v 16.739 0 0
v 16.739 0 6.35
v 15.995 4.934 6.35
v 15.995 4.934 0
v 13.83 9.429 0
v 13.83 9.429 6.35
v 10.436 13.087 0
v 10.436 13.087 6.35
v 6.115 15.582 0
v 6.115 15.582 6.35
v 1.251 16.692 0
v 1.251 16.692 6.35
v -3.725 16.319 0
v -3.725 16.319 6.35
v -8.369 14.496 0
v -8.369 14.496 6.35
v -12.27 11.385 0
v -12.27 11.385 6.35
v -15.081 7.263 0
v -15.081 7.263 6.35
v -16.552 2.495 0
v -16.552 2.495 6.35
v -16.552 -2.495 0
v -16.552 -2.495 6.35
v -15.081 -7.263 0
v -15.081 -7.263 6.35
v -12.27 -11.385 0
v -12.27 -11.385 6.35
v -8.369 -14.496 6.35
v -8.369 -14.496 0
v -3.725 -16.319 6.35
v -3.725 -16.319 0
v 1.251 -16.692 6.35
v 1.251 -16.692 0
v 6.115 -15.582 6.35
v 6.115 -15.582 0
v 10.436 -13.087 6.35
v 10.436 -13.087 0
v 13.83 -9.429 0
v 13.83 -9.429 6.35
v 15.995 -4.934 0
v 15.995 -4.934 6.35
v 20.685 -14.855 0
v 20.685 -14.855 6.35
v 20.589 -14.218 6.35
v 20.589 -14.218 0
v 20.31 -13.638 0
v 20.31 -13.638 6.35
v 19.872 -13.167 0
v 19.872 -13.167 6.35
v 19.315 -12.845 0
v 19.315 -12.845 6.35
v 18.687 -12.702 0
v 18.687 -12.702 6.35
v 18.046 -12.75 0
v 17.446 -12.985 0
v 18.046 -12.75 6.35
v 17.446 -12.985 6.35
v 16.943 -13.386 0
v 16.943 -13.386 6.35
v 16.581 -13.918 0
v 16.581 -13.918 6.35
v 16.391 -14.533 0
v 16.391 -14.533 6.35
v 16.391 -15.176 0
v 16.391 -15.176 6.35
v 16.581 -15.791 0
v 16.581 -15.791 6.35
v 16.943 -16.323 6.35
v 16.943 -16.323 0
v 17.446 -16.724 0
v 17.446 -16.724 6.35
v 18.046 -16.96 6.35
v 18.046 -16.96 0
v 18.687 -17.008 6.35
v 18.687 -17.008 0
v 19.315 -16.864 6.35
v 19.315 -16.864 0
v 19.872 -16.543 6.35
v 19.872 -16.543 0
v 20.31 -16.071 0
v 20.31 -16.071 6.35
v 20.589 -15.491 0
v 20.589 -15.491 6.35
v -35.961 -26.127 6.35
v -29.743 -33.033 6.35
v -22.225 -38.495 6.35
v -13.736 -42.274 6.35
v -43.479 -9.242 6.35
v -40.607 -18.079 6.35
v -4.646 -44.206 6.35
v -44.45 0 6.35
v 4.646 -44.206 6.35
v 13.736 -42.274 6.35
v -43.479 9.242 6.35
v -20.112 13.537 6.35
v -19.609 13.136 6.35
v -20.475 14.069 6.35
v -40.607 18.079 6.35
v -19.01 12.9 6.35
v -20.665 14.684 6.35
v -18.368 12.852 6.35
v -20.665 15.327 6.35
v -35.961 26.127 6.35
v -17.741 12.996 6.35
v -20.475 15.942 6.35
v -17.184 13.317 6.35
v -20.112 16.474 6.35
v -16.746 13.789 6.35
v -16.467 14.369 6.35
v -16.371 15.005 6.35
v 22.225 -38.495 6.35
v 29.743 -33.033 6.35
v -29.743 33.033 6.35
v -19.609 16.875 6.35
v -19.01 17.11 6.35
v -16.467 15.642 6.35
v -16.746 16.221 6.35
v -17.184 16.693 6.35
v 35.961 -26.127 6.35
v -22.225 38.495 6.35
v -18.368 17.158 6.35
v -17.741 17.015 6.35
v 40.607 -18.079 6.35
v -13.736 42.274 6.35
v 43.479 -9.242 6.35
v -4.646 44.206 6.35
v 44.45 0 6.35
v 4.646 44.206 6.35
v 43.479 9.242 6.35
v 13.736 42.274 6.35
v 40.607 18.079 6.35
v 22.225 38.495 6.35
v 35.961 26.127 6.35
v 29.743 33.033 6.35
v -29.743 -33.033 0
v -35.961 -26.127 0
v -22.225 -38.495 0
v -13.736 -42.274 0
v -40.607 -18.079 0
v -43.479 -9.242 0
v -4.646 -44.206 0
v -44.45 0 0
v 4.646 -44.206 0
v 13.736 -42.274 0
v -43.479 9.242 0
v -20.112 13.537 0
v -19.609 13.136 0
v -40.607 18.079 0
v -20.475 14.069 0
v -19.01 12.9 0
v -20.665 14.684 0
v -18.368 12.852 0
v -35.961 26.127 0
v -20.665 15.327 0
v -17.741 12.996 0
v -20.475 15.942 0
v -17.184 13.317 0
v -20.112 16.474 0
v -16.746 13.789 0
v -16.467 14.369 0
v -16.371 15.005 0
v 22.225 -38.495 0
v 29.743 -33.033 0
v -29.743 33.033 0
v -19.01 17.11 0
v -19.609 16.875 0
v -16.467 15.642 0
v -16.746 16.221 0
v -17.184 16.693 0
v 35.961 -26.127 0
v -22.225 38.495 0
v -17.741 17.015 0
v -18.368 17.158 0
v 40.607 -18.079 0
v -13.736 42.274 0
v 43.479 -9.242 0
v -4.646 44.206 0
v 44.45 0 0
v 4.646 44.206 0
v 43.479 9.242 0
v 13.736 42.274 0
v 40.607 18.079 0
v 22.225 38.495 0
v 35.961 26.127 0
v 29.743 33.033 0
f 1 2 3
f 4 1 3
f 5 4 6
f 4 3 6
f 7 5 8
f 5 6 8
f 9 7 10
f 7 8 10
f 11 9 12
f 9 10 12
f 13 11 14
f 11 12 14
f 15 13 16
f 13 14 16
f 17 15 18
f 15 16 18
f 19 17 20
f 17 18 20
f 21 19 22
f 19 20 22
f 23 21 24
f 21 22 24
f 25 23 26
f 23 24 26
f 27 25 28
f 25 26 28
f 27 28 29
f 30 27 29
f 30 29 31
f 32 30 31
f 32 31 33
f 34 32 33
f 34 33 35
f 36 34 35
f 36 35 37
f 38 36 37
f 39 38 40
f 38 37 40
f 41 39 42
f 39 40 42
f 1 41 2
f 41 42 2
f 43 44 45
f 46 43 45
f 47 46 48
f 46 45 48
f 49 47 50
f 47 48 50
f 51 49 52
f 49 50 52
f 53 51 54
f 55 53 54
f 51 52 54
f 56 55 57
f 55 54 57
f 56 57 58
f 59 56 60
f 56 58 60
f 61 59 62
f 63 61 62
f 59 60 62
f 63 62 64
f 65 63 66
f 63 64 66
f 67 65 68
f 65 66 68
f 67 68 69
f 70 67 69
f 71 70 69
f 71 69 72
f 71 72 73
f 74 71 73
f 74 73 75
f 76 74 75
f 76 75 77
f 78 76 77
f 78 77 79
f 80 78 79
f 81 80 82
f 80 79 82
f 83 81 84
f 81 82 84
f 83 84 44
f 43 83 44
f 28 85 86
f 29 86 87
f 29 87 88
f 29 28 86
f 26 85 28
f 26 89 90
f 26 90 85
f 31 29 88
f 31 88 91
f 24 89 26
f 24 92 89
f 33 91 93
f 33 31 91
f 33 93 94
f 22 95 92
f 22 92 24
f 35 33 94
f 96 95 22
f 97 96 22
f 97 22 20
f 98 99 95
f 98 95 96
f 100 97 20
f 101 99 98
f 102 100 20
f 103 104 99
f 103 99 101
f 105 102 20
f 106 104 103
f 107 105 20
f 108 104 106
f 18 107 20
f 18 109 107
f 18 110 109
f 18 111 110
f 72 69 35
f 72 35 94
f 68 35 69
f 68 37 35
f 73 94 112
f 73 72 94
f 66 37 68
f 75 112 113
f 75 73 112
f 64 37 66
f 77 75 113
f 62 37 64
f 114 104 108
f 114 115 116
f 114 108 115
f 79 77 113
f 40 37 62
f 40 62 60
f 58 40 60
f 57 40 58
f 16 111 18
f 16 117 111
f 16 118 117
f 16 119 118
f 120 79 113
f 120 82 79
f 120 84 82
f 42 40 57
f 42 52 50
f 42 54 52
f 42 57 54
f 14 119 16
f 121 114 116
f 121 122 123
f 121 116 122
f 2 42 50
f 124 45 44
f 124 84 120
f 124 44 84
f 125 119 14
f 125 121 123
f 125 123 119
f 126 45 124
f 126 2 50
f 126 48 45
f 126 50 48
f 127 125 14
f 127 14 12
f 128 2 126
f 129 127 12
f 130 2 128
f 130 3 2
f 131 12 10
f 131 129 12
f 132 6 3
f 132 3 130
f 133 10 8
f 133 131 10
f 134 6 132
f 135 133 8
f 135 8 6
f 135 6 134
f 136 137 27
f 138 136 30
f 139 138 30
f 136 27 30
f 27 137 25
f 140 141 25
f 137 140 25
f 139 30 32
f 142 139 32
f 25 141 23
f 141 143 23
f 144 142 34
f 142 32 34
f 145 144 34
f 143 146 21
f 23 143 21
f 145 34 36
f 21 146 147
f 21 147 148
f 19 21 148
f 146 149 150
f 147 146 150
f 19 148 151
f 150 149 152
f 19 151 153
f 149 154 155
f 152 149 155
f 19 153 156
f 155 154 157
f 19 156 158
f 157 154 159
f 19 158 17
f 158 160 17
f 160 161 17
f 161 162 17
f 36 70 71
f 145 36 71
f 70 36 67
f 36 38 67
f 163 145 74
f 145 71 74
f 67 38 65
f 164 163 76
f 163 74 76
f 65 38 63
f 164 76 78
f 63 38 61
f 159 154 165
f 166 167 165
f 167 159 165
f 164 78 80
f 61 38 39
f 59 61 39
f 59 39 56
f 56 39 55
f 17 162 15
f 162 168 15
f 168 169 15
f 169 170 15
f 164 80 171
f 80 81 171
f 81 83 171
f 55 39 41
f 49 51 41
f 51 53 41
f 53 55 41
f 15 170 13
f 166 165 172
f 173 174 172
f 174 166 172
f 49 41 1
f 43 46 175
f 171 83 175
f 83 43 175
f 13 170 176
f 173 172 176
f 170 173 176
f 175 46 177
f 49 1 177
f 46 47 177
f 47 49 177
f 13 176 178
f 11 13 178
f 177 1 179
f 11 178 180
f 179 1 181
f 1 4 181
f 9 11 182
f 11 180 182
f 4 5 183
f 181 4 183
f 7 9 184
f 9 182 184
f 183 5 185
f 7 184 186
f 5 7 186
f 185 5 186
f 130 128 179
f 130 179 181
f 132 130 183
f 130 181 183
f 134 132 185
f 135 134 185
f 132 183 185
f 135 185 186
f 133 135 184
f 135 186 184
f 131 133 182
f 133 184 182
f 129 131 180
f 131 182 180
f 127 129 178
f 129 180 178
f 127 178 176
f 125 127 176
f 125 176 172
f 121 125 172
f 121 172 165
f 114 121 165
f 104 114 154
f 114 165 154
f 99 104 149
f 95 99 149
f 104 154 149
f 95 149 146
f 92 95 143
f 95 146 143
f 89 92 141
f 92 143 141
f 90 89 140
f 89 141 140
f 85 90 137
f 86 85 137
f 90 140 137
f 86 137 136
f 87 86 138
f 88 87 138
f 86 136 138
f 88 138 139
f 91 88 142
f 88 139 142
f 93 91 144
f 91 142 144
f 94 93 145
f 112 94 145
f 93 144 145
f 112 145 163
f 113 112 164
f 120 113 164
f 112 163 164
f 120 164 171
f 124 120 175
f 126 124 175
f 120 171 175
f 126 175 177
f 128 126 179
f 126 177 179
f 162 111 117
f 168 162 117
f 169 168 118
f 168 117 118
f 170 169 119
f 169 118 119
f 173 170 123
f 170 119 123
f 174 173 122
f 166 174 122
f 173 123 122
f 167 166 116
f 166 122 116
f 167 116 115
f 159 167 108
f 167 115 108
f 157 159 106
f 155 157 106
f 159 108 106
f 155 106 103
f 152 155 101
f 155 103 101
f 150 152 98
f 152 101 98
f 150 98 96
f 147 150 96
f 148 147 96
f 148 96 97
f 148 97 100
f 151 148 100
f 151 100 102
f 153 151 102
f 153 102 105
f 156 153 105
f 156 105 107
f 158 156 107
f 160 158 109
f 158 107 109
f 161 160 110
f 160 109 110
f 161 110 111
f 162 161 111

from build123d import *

# Parameters (mm, degrees)
F0_R      = 44.45
F1_DEPTH  = 6.35
F2_R      = 16.7386
F3_DEPTH  = 6.35
F7_R      = 2.159
F8_DEPTH  = 6.35
F9_R      = 2.159
F10_DEPTH = 6.35


with BuildPart() as f1:
    # F0 (on Top) → F1 (new body)
    with BuildSketch(Plane.XY):
        Circle(F0_R)
    extrude(amount=F1_DEPTH)

    # F2 (on face) → F3 (cut)
    with BuildSketch(Plane.XY.offset(6.35)):
        Circle(F2_R)
    extrude(amount=-F3_DEPTH, mode=Mode.SUBTRACT)

    # F7 (on face) → F8 (cut)
    with BuildSketch(Plane.XY.offset(6.35)):
        with Locations((-18.529808, 15.005284)):
            Circle(F7_R)
    extrude(amount=-F8_DEPTH, mode=Mode.SUBTRACT)

    # F9 (on face) → F10 (cut)
    with BuildSketch(Plane.XY.offset(6.35)):
        with Locations((18.525945, -14.854639)):
            Circle(F9_R)
    extrude(amount=-F10_DEPTH, mode=Mode.SUBTRACT)


solid = f1.part
